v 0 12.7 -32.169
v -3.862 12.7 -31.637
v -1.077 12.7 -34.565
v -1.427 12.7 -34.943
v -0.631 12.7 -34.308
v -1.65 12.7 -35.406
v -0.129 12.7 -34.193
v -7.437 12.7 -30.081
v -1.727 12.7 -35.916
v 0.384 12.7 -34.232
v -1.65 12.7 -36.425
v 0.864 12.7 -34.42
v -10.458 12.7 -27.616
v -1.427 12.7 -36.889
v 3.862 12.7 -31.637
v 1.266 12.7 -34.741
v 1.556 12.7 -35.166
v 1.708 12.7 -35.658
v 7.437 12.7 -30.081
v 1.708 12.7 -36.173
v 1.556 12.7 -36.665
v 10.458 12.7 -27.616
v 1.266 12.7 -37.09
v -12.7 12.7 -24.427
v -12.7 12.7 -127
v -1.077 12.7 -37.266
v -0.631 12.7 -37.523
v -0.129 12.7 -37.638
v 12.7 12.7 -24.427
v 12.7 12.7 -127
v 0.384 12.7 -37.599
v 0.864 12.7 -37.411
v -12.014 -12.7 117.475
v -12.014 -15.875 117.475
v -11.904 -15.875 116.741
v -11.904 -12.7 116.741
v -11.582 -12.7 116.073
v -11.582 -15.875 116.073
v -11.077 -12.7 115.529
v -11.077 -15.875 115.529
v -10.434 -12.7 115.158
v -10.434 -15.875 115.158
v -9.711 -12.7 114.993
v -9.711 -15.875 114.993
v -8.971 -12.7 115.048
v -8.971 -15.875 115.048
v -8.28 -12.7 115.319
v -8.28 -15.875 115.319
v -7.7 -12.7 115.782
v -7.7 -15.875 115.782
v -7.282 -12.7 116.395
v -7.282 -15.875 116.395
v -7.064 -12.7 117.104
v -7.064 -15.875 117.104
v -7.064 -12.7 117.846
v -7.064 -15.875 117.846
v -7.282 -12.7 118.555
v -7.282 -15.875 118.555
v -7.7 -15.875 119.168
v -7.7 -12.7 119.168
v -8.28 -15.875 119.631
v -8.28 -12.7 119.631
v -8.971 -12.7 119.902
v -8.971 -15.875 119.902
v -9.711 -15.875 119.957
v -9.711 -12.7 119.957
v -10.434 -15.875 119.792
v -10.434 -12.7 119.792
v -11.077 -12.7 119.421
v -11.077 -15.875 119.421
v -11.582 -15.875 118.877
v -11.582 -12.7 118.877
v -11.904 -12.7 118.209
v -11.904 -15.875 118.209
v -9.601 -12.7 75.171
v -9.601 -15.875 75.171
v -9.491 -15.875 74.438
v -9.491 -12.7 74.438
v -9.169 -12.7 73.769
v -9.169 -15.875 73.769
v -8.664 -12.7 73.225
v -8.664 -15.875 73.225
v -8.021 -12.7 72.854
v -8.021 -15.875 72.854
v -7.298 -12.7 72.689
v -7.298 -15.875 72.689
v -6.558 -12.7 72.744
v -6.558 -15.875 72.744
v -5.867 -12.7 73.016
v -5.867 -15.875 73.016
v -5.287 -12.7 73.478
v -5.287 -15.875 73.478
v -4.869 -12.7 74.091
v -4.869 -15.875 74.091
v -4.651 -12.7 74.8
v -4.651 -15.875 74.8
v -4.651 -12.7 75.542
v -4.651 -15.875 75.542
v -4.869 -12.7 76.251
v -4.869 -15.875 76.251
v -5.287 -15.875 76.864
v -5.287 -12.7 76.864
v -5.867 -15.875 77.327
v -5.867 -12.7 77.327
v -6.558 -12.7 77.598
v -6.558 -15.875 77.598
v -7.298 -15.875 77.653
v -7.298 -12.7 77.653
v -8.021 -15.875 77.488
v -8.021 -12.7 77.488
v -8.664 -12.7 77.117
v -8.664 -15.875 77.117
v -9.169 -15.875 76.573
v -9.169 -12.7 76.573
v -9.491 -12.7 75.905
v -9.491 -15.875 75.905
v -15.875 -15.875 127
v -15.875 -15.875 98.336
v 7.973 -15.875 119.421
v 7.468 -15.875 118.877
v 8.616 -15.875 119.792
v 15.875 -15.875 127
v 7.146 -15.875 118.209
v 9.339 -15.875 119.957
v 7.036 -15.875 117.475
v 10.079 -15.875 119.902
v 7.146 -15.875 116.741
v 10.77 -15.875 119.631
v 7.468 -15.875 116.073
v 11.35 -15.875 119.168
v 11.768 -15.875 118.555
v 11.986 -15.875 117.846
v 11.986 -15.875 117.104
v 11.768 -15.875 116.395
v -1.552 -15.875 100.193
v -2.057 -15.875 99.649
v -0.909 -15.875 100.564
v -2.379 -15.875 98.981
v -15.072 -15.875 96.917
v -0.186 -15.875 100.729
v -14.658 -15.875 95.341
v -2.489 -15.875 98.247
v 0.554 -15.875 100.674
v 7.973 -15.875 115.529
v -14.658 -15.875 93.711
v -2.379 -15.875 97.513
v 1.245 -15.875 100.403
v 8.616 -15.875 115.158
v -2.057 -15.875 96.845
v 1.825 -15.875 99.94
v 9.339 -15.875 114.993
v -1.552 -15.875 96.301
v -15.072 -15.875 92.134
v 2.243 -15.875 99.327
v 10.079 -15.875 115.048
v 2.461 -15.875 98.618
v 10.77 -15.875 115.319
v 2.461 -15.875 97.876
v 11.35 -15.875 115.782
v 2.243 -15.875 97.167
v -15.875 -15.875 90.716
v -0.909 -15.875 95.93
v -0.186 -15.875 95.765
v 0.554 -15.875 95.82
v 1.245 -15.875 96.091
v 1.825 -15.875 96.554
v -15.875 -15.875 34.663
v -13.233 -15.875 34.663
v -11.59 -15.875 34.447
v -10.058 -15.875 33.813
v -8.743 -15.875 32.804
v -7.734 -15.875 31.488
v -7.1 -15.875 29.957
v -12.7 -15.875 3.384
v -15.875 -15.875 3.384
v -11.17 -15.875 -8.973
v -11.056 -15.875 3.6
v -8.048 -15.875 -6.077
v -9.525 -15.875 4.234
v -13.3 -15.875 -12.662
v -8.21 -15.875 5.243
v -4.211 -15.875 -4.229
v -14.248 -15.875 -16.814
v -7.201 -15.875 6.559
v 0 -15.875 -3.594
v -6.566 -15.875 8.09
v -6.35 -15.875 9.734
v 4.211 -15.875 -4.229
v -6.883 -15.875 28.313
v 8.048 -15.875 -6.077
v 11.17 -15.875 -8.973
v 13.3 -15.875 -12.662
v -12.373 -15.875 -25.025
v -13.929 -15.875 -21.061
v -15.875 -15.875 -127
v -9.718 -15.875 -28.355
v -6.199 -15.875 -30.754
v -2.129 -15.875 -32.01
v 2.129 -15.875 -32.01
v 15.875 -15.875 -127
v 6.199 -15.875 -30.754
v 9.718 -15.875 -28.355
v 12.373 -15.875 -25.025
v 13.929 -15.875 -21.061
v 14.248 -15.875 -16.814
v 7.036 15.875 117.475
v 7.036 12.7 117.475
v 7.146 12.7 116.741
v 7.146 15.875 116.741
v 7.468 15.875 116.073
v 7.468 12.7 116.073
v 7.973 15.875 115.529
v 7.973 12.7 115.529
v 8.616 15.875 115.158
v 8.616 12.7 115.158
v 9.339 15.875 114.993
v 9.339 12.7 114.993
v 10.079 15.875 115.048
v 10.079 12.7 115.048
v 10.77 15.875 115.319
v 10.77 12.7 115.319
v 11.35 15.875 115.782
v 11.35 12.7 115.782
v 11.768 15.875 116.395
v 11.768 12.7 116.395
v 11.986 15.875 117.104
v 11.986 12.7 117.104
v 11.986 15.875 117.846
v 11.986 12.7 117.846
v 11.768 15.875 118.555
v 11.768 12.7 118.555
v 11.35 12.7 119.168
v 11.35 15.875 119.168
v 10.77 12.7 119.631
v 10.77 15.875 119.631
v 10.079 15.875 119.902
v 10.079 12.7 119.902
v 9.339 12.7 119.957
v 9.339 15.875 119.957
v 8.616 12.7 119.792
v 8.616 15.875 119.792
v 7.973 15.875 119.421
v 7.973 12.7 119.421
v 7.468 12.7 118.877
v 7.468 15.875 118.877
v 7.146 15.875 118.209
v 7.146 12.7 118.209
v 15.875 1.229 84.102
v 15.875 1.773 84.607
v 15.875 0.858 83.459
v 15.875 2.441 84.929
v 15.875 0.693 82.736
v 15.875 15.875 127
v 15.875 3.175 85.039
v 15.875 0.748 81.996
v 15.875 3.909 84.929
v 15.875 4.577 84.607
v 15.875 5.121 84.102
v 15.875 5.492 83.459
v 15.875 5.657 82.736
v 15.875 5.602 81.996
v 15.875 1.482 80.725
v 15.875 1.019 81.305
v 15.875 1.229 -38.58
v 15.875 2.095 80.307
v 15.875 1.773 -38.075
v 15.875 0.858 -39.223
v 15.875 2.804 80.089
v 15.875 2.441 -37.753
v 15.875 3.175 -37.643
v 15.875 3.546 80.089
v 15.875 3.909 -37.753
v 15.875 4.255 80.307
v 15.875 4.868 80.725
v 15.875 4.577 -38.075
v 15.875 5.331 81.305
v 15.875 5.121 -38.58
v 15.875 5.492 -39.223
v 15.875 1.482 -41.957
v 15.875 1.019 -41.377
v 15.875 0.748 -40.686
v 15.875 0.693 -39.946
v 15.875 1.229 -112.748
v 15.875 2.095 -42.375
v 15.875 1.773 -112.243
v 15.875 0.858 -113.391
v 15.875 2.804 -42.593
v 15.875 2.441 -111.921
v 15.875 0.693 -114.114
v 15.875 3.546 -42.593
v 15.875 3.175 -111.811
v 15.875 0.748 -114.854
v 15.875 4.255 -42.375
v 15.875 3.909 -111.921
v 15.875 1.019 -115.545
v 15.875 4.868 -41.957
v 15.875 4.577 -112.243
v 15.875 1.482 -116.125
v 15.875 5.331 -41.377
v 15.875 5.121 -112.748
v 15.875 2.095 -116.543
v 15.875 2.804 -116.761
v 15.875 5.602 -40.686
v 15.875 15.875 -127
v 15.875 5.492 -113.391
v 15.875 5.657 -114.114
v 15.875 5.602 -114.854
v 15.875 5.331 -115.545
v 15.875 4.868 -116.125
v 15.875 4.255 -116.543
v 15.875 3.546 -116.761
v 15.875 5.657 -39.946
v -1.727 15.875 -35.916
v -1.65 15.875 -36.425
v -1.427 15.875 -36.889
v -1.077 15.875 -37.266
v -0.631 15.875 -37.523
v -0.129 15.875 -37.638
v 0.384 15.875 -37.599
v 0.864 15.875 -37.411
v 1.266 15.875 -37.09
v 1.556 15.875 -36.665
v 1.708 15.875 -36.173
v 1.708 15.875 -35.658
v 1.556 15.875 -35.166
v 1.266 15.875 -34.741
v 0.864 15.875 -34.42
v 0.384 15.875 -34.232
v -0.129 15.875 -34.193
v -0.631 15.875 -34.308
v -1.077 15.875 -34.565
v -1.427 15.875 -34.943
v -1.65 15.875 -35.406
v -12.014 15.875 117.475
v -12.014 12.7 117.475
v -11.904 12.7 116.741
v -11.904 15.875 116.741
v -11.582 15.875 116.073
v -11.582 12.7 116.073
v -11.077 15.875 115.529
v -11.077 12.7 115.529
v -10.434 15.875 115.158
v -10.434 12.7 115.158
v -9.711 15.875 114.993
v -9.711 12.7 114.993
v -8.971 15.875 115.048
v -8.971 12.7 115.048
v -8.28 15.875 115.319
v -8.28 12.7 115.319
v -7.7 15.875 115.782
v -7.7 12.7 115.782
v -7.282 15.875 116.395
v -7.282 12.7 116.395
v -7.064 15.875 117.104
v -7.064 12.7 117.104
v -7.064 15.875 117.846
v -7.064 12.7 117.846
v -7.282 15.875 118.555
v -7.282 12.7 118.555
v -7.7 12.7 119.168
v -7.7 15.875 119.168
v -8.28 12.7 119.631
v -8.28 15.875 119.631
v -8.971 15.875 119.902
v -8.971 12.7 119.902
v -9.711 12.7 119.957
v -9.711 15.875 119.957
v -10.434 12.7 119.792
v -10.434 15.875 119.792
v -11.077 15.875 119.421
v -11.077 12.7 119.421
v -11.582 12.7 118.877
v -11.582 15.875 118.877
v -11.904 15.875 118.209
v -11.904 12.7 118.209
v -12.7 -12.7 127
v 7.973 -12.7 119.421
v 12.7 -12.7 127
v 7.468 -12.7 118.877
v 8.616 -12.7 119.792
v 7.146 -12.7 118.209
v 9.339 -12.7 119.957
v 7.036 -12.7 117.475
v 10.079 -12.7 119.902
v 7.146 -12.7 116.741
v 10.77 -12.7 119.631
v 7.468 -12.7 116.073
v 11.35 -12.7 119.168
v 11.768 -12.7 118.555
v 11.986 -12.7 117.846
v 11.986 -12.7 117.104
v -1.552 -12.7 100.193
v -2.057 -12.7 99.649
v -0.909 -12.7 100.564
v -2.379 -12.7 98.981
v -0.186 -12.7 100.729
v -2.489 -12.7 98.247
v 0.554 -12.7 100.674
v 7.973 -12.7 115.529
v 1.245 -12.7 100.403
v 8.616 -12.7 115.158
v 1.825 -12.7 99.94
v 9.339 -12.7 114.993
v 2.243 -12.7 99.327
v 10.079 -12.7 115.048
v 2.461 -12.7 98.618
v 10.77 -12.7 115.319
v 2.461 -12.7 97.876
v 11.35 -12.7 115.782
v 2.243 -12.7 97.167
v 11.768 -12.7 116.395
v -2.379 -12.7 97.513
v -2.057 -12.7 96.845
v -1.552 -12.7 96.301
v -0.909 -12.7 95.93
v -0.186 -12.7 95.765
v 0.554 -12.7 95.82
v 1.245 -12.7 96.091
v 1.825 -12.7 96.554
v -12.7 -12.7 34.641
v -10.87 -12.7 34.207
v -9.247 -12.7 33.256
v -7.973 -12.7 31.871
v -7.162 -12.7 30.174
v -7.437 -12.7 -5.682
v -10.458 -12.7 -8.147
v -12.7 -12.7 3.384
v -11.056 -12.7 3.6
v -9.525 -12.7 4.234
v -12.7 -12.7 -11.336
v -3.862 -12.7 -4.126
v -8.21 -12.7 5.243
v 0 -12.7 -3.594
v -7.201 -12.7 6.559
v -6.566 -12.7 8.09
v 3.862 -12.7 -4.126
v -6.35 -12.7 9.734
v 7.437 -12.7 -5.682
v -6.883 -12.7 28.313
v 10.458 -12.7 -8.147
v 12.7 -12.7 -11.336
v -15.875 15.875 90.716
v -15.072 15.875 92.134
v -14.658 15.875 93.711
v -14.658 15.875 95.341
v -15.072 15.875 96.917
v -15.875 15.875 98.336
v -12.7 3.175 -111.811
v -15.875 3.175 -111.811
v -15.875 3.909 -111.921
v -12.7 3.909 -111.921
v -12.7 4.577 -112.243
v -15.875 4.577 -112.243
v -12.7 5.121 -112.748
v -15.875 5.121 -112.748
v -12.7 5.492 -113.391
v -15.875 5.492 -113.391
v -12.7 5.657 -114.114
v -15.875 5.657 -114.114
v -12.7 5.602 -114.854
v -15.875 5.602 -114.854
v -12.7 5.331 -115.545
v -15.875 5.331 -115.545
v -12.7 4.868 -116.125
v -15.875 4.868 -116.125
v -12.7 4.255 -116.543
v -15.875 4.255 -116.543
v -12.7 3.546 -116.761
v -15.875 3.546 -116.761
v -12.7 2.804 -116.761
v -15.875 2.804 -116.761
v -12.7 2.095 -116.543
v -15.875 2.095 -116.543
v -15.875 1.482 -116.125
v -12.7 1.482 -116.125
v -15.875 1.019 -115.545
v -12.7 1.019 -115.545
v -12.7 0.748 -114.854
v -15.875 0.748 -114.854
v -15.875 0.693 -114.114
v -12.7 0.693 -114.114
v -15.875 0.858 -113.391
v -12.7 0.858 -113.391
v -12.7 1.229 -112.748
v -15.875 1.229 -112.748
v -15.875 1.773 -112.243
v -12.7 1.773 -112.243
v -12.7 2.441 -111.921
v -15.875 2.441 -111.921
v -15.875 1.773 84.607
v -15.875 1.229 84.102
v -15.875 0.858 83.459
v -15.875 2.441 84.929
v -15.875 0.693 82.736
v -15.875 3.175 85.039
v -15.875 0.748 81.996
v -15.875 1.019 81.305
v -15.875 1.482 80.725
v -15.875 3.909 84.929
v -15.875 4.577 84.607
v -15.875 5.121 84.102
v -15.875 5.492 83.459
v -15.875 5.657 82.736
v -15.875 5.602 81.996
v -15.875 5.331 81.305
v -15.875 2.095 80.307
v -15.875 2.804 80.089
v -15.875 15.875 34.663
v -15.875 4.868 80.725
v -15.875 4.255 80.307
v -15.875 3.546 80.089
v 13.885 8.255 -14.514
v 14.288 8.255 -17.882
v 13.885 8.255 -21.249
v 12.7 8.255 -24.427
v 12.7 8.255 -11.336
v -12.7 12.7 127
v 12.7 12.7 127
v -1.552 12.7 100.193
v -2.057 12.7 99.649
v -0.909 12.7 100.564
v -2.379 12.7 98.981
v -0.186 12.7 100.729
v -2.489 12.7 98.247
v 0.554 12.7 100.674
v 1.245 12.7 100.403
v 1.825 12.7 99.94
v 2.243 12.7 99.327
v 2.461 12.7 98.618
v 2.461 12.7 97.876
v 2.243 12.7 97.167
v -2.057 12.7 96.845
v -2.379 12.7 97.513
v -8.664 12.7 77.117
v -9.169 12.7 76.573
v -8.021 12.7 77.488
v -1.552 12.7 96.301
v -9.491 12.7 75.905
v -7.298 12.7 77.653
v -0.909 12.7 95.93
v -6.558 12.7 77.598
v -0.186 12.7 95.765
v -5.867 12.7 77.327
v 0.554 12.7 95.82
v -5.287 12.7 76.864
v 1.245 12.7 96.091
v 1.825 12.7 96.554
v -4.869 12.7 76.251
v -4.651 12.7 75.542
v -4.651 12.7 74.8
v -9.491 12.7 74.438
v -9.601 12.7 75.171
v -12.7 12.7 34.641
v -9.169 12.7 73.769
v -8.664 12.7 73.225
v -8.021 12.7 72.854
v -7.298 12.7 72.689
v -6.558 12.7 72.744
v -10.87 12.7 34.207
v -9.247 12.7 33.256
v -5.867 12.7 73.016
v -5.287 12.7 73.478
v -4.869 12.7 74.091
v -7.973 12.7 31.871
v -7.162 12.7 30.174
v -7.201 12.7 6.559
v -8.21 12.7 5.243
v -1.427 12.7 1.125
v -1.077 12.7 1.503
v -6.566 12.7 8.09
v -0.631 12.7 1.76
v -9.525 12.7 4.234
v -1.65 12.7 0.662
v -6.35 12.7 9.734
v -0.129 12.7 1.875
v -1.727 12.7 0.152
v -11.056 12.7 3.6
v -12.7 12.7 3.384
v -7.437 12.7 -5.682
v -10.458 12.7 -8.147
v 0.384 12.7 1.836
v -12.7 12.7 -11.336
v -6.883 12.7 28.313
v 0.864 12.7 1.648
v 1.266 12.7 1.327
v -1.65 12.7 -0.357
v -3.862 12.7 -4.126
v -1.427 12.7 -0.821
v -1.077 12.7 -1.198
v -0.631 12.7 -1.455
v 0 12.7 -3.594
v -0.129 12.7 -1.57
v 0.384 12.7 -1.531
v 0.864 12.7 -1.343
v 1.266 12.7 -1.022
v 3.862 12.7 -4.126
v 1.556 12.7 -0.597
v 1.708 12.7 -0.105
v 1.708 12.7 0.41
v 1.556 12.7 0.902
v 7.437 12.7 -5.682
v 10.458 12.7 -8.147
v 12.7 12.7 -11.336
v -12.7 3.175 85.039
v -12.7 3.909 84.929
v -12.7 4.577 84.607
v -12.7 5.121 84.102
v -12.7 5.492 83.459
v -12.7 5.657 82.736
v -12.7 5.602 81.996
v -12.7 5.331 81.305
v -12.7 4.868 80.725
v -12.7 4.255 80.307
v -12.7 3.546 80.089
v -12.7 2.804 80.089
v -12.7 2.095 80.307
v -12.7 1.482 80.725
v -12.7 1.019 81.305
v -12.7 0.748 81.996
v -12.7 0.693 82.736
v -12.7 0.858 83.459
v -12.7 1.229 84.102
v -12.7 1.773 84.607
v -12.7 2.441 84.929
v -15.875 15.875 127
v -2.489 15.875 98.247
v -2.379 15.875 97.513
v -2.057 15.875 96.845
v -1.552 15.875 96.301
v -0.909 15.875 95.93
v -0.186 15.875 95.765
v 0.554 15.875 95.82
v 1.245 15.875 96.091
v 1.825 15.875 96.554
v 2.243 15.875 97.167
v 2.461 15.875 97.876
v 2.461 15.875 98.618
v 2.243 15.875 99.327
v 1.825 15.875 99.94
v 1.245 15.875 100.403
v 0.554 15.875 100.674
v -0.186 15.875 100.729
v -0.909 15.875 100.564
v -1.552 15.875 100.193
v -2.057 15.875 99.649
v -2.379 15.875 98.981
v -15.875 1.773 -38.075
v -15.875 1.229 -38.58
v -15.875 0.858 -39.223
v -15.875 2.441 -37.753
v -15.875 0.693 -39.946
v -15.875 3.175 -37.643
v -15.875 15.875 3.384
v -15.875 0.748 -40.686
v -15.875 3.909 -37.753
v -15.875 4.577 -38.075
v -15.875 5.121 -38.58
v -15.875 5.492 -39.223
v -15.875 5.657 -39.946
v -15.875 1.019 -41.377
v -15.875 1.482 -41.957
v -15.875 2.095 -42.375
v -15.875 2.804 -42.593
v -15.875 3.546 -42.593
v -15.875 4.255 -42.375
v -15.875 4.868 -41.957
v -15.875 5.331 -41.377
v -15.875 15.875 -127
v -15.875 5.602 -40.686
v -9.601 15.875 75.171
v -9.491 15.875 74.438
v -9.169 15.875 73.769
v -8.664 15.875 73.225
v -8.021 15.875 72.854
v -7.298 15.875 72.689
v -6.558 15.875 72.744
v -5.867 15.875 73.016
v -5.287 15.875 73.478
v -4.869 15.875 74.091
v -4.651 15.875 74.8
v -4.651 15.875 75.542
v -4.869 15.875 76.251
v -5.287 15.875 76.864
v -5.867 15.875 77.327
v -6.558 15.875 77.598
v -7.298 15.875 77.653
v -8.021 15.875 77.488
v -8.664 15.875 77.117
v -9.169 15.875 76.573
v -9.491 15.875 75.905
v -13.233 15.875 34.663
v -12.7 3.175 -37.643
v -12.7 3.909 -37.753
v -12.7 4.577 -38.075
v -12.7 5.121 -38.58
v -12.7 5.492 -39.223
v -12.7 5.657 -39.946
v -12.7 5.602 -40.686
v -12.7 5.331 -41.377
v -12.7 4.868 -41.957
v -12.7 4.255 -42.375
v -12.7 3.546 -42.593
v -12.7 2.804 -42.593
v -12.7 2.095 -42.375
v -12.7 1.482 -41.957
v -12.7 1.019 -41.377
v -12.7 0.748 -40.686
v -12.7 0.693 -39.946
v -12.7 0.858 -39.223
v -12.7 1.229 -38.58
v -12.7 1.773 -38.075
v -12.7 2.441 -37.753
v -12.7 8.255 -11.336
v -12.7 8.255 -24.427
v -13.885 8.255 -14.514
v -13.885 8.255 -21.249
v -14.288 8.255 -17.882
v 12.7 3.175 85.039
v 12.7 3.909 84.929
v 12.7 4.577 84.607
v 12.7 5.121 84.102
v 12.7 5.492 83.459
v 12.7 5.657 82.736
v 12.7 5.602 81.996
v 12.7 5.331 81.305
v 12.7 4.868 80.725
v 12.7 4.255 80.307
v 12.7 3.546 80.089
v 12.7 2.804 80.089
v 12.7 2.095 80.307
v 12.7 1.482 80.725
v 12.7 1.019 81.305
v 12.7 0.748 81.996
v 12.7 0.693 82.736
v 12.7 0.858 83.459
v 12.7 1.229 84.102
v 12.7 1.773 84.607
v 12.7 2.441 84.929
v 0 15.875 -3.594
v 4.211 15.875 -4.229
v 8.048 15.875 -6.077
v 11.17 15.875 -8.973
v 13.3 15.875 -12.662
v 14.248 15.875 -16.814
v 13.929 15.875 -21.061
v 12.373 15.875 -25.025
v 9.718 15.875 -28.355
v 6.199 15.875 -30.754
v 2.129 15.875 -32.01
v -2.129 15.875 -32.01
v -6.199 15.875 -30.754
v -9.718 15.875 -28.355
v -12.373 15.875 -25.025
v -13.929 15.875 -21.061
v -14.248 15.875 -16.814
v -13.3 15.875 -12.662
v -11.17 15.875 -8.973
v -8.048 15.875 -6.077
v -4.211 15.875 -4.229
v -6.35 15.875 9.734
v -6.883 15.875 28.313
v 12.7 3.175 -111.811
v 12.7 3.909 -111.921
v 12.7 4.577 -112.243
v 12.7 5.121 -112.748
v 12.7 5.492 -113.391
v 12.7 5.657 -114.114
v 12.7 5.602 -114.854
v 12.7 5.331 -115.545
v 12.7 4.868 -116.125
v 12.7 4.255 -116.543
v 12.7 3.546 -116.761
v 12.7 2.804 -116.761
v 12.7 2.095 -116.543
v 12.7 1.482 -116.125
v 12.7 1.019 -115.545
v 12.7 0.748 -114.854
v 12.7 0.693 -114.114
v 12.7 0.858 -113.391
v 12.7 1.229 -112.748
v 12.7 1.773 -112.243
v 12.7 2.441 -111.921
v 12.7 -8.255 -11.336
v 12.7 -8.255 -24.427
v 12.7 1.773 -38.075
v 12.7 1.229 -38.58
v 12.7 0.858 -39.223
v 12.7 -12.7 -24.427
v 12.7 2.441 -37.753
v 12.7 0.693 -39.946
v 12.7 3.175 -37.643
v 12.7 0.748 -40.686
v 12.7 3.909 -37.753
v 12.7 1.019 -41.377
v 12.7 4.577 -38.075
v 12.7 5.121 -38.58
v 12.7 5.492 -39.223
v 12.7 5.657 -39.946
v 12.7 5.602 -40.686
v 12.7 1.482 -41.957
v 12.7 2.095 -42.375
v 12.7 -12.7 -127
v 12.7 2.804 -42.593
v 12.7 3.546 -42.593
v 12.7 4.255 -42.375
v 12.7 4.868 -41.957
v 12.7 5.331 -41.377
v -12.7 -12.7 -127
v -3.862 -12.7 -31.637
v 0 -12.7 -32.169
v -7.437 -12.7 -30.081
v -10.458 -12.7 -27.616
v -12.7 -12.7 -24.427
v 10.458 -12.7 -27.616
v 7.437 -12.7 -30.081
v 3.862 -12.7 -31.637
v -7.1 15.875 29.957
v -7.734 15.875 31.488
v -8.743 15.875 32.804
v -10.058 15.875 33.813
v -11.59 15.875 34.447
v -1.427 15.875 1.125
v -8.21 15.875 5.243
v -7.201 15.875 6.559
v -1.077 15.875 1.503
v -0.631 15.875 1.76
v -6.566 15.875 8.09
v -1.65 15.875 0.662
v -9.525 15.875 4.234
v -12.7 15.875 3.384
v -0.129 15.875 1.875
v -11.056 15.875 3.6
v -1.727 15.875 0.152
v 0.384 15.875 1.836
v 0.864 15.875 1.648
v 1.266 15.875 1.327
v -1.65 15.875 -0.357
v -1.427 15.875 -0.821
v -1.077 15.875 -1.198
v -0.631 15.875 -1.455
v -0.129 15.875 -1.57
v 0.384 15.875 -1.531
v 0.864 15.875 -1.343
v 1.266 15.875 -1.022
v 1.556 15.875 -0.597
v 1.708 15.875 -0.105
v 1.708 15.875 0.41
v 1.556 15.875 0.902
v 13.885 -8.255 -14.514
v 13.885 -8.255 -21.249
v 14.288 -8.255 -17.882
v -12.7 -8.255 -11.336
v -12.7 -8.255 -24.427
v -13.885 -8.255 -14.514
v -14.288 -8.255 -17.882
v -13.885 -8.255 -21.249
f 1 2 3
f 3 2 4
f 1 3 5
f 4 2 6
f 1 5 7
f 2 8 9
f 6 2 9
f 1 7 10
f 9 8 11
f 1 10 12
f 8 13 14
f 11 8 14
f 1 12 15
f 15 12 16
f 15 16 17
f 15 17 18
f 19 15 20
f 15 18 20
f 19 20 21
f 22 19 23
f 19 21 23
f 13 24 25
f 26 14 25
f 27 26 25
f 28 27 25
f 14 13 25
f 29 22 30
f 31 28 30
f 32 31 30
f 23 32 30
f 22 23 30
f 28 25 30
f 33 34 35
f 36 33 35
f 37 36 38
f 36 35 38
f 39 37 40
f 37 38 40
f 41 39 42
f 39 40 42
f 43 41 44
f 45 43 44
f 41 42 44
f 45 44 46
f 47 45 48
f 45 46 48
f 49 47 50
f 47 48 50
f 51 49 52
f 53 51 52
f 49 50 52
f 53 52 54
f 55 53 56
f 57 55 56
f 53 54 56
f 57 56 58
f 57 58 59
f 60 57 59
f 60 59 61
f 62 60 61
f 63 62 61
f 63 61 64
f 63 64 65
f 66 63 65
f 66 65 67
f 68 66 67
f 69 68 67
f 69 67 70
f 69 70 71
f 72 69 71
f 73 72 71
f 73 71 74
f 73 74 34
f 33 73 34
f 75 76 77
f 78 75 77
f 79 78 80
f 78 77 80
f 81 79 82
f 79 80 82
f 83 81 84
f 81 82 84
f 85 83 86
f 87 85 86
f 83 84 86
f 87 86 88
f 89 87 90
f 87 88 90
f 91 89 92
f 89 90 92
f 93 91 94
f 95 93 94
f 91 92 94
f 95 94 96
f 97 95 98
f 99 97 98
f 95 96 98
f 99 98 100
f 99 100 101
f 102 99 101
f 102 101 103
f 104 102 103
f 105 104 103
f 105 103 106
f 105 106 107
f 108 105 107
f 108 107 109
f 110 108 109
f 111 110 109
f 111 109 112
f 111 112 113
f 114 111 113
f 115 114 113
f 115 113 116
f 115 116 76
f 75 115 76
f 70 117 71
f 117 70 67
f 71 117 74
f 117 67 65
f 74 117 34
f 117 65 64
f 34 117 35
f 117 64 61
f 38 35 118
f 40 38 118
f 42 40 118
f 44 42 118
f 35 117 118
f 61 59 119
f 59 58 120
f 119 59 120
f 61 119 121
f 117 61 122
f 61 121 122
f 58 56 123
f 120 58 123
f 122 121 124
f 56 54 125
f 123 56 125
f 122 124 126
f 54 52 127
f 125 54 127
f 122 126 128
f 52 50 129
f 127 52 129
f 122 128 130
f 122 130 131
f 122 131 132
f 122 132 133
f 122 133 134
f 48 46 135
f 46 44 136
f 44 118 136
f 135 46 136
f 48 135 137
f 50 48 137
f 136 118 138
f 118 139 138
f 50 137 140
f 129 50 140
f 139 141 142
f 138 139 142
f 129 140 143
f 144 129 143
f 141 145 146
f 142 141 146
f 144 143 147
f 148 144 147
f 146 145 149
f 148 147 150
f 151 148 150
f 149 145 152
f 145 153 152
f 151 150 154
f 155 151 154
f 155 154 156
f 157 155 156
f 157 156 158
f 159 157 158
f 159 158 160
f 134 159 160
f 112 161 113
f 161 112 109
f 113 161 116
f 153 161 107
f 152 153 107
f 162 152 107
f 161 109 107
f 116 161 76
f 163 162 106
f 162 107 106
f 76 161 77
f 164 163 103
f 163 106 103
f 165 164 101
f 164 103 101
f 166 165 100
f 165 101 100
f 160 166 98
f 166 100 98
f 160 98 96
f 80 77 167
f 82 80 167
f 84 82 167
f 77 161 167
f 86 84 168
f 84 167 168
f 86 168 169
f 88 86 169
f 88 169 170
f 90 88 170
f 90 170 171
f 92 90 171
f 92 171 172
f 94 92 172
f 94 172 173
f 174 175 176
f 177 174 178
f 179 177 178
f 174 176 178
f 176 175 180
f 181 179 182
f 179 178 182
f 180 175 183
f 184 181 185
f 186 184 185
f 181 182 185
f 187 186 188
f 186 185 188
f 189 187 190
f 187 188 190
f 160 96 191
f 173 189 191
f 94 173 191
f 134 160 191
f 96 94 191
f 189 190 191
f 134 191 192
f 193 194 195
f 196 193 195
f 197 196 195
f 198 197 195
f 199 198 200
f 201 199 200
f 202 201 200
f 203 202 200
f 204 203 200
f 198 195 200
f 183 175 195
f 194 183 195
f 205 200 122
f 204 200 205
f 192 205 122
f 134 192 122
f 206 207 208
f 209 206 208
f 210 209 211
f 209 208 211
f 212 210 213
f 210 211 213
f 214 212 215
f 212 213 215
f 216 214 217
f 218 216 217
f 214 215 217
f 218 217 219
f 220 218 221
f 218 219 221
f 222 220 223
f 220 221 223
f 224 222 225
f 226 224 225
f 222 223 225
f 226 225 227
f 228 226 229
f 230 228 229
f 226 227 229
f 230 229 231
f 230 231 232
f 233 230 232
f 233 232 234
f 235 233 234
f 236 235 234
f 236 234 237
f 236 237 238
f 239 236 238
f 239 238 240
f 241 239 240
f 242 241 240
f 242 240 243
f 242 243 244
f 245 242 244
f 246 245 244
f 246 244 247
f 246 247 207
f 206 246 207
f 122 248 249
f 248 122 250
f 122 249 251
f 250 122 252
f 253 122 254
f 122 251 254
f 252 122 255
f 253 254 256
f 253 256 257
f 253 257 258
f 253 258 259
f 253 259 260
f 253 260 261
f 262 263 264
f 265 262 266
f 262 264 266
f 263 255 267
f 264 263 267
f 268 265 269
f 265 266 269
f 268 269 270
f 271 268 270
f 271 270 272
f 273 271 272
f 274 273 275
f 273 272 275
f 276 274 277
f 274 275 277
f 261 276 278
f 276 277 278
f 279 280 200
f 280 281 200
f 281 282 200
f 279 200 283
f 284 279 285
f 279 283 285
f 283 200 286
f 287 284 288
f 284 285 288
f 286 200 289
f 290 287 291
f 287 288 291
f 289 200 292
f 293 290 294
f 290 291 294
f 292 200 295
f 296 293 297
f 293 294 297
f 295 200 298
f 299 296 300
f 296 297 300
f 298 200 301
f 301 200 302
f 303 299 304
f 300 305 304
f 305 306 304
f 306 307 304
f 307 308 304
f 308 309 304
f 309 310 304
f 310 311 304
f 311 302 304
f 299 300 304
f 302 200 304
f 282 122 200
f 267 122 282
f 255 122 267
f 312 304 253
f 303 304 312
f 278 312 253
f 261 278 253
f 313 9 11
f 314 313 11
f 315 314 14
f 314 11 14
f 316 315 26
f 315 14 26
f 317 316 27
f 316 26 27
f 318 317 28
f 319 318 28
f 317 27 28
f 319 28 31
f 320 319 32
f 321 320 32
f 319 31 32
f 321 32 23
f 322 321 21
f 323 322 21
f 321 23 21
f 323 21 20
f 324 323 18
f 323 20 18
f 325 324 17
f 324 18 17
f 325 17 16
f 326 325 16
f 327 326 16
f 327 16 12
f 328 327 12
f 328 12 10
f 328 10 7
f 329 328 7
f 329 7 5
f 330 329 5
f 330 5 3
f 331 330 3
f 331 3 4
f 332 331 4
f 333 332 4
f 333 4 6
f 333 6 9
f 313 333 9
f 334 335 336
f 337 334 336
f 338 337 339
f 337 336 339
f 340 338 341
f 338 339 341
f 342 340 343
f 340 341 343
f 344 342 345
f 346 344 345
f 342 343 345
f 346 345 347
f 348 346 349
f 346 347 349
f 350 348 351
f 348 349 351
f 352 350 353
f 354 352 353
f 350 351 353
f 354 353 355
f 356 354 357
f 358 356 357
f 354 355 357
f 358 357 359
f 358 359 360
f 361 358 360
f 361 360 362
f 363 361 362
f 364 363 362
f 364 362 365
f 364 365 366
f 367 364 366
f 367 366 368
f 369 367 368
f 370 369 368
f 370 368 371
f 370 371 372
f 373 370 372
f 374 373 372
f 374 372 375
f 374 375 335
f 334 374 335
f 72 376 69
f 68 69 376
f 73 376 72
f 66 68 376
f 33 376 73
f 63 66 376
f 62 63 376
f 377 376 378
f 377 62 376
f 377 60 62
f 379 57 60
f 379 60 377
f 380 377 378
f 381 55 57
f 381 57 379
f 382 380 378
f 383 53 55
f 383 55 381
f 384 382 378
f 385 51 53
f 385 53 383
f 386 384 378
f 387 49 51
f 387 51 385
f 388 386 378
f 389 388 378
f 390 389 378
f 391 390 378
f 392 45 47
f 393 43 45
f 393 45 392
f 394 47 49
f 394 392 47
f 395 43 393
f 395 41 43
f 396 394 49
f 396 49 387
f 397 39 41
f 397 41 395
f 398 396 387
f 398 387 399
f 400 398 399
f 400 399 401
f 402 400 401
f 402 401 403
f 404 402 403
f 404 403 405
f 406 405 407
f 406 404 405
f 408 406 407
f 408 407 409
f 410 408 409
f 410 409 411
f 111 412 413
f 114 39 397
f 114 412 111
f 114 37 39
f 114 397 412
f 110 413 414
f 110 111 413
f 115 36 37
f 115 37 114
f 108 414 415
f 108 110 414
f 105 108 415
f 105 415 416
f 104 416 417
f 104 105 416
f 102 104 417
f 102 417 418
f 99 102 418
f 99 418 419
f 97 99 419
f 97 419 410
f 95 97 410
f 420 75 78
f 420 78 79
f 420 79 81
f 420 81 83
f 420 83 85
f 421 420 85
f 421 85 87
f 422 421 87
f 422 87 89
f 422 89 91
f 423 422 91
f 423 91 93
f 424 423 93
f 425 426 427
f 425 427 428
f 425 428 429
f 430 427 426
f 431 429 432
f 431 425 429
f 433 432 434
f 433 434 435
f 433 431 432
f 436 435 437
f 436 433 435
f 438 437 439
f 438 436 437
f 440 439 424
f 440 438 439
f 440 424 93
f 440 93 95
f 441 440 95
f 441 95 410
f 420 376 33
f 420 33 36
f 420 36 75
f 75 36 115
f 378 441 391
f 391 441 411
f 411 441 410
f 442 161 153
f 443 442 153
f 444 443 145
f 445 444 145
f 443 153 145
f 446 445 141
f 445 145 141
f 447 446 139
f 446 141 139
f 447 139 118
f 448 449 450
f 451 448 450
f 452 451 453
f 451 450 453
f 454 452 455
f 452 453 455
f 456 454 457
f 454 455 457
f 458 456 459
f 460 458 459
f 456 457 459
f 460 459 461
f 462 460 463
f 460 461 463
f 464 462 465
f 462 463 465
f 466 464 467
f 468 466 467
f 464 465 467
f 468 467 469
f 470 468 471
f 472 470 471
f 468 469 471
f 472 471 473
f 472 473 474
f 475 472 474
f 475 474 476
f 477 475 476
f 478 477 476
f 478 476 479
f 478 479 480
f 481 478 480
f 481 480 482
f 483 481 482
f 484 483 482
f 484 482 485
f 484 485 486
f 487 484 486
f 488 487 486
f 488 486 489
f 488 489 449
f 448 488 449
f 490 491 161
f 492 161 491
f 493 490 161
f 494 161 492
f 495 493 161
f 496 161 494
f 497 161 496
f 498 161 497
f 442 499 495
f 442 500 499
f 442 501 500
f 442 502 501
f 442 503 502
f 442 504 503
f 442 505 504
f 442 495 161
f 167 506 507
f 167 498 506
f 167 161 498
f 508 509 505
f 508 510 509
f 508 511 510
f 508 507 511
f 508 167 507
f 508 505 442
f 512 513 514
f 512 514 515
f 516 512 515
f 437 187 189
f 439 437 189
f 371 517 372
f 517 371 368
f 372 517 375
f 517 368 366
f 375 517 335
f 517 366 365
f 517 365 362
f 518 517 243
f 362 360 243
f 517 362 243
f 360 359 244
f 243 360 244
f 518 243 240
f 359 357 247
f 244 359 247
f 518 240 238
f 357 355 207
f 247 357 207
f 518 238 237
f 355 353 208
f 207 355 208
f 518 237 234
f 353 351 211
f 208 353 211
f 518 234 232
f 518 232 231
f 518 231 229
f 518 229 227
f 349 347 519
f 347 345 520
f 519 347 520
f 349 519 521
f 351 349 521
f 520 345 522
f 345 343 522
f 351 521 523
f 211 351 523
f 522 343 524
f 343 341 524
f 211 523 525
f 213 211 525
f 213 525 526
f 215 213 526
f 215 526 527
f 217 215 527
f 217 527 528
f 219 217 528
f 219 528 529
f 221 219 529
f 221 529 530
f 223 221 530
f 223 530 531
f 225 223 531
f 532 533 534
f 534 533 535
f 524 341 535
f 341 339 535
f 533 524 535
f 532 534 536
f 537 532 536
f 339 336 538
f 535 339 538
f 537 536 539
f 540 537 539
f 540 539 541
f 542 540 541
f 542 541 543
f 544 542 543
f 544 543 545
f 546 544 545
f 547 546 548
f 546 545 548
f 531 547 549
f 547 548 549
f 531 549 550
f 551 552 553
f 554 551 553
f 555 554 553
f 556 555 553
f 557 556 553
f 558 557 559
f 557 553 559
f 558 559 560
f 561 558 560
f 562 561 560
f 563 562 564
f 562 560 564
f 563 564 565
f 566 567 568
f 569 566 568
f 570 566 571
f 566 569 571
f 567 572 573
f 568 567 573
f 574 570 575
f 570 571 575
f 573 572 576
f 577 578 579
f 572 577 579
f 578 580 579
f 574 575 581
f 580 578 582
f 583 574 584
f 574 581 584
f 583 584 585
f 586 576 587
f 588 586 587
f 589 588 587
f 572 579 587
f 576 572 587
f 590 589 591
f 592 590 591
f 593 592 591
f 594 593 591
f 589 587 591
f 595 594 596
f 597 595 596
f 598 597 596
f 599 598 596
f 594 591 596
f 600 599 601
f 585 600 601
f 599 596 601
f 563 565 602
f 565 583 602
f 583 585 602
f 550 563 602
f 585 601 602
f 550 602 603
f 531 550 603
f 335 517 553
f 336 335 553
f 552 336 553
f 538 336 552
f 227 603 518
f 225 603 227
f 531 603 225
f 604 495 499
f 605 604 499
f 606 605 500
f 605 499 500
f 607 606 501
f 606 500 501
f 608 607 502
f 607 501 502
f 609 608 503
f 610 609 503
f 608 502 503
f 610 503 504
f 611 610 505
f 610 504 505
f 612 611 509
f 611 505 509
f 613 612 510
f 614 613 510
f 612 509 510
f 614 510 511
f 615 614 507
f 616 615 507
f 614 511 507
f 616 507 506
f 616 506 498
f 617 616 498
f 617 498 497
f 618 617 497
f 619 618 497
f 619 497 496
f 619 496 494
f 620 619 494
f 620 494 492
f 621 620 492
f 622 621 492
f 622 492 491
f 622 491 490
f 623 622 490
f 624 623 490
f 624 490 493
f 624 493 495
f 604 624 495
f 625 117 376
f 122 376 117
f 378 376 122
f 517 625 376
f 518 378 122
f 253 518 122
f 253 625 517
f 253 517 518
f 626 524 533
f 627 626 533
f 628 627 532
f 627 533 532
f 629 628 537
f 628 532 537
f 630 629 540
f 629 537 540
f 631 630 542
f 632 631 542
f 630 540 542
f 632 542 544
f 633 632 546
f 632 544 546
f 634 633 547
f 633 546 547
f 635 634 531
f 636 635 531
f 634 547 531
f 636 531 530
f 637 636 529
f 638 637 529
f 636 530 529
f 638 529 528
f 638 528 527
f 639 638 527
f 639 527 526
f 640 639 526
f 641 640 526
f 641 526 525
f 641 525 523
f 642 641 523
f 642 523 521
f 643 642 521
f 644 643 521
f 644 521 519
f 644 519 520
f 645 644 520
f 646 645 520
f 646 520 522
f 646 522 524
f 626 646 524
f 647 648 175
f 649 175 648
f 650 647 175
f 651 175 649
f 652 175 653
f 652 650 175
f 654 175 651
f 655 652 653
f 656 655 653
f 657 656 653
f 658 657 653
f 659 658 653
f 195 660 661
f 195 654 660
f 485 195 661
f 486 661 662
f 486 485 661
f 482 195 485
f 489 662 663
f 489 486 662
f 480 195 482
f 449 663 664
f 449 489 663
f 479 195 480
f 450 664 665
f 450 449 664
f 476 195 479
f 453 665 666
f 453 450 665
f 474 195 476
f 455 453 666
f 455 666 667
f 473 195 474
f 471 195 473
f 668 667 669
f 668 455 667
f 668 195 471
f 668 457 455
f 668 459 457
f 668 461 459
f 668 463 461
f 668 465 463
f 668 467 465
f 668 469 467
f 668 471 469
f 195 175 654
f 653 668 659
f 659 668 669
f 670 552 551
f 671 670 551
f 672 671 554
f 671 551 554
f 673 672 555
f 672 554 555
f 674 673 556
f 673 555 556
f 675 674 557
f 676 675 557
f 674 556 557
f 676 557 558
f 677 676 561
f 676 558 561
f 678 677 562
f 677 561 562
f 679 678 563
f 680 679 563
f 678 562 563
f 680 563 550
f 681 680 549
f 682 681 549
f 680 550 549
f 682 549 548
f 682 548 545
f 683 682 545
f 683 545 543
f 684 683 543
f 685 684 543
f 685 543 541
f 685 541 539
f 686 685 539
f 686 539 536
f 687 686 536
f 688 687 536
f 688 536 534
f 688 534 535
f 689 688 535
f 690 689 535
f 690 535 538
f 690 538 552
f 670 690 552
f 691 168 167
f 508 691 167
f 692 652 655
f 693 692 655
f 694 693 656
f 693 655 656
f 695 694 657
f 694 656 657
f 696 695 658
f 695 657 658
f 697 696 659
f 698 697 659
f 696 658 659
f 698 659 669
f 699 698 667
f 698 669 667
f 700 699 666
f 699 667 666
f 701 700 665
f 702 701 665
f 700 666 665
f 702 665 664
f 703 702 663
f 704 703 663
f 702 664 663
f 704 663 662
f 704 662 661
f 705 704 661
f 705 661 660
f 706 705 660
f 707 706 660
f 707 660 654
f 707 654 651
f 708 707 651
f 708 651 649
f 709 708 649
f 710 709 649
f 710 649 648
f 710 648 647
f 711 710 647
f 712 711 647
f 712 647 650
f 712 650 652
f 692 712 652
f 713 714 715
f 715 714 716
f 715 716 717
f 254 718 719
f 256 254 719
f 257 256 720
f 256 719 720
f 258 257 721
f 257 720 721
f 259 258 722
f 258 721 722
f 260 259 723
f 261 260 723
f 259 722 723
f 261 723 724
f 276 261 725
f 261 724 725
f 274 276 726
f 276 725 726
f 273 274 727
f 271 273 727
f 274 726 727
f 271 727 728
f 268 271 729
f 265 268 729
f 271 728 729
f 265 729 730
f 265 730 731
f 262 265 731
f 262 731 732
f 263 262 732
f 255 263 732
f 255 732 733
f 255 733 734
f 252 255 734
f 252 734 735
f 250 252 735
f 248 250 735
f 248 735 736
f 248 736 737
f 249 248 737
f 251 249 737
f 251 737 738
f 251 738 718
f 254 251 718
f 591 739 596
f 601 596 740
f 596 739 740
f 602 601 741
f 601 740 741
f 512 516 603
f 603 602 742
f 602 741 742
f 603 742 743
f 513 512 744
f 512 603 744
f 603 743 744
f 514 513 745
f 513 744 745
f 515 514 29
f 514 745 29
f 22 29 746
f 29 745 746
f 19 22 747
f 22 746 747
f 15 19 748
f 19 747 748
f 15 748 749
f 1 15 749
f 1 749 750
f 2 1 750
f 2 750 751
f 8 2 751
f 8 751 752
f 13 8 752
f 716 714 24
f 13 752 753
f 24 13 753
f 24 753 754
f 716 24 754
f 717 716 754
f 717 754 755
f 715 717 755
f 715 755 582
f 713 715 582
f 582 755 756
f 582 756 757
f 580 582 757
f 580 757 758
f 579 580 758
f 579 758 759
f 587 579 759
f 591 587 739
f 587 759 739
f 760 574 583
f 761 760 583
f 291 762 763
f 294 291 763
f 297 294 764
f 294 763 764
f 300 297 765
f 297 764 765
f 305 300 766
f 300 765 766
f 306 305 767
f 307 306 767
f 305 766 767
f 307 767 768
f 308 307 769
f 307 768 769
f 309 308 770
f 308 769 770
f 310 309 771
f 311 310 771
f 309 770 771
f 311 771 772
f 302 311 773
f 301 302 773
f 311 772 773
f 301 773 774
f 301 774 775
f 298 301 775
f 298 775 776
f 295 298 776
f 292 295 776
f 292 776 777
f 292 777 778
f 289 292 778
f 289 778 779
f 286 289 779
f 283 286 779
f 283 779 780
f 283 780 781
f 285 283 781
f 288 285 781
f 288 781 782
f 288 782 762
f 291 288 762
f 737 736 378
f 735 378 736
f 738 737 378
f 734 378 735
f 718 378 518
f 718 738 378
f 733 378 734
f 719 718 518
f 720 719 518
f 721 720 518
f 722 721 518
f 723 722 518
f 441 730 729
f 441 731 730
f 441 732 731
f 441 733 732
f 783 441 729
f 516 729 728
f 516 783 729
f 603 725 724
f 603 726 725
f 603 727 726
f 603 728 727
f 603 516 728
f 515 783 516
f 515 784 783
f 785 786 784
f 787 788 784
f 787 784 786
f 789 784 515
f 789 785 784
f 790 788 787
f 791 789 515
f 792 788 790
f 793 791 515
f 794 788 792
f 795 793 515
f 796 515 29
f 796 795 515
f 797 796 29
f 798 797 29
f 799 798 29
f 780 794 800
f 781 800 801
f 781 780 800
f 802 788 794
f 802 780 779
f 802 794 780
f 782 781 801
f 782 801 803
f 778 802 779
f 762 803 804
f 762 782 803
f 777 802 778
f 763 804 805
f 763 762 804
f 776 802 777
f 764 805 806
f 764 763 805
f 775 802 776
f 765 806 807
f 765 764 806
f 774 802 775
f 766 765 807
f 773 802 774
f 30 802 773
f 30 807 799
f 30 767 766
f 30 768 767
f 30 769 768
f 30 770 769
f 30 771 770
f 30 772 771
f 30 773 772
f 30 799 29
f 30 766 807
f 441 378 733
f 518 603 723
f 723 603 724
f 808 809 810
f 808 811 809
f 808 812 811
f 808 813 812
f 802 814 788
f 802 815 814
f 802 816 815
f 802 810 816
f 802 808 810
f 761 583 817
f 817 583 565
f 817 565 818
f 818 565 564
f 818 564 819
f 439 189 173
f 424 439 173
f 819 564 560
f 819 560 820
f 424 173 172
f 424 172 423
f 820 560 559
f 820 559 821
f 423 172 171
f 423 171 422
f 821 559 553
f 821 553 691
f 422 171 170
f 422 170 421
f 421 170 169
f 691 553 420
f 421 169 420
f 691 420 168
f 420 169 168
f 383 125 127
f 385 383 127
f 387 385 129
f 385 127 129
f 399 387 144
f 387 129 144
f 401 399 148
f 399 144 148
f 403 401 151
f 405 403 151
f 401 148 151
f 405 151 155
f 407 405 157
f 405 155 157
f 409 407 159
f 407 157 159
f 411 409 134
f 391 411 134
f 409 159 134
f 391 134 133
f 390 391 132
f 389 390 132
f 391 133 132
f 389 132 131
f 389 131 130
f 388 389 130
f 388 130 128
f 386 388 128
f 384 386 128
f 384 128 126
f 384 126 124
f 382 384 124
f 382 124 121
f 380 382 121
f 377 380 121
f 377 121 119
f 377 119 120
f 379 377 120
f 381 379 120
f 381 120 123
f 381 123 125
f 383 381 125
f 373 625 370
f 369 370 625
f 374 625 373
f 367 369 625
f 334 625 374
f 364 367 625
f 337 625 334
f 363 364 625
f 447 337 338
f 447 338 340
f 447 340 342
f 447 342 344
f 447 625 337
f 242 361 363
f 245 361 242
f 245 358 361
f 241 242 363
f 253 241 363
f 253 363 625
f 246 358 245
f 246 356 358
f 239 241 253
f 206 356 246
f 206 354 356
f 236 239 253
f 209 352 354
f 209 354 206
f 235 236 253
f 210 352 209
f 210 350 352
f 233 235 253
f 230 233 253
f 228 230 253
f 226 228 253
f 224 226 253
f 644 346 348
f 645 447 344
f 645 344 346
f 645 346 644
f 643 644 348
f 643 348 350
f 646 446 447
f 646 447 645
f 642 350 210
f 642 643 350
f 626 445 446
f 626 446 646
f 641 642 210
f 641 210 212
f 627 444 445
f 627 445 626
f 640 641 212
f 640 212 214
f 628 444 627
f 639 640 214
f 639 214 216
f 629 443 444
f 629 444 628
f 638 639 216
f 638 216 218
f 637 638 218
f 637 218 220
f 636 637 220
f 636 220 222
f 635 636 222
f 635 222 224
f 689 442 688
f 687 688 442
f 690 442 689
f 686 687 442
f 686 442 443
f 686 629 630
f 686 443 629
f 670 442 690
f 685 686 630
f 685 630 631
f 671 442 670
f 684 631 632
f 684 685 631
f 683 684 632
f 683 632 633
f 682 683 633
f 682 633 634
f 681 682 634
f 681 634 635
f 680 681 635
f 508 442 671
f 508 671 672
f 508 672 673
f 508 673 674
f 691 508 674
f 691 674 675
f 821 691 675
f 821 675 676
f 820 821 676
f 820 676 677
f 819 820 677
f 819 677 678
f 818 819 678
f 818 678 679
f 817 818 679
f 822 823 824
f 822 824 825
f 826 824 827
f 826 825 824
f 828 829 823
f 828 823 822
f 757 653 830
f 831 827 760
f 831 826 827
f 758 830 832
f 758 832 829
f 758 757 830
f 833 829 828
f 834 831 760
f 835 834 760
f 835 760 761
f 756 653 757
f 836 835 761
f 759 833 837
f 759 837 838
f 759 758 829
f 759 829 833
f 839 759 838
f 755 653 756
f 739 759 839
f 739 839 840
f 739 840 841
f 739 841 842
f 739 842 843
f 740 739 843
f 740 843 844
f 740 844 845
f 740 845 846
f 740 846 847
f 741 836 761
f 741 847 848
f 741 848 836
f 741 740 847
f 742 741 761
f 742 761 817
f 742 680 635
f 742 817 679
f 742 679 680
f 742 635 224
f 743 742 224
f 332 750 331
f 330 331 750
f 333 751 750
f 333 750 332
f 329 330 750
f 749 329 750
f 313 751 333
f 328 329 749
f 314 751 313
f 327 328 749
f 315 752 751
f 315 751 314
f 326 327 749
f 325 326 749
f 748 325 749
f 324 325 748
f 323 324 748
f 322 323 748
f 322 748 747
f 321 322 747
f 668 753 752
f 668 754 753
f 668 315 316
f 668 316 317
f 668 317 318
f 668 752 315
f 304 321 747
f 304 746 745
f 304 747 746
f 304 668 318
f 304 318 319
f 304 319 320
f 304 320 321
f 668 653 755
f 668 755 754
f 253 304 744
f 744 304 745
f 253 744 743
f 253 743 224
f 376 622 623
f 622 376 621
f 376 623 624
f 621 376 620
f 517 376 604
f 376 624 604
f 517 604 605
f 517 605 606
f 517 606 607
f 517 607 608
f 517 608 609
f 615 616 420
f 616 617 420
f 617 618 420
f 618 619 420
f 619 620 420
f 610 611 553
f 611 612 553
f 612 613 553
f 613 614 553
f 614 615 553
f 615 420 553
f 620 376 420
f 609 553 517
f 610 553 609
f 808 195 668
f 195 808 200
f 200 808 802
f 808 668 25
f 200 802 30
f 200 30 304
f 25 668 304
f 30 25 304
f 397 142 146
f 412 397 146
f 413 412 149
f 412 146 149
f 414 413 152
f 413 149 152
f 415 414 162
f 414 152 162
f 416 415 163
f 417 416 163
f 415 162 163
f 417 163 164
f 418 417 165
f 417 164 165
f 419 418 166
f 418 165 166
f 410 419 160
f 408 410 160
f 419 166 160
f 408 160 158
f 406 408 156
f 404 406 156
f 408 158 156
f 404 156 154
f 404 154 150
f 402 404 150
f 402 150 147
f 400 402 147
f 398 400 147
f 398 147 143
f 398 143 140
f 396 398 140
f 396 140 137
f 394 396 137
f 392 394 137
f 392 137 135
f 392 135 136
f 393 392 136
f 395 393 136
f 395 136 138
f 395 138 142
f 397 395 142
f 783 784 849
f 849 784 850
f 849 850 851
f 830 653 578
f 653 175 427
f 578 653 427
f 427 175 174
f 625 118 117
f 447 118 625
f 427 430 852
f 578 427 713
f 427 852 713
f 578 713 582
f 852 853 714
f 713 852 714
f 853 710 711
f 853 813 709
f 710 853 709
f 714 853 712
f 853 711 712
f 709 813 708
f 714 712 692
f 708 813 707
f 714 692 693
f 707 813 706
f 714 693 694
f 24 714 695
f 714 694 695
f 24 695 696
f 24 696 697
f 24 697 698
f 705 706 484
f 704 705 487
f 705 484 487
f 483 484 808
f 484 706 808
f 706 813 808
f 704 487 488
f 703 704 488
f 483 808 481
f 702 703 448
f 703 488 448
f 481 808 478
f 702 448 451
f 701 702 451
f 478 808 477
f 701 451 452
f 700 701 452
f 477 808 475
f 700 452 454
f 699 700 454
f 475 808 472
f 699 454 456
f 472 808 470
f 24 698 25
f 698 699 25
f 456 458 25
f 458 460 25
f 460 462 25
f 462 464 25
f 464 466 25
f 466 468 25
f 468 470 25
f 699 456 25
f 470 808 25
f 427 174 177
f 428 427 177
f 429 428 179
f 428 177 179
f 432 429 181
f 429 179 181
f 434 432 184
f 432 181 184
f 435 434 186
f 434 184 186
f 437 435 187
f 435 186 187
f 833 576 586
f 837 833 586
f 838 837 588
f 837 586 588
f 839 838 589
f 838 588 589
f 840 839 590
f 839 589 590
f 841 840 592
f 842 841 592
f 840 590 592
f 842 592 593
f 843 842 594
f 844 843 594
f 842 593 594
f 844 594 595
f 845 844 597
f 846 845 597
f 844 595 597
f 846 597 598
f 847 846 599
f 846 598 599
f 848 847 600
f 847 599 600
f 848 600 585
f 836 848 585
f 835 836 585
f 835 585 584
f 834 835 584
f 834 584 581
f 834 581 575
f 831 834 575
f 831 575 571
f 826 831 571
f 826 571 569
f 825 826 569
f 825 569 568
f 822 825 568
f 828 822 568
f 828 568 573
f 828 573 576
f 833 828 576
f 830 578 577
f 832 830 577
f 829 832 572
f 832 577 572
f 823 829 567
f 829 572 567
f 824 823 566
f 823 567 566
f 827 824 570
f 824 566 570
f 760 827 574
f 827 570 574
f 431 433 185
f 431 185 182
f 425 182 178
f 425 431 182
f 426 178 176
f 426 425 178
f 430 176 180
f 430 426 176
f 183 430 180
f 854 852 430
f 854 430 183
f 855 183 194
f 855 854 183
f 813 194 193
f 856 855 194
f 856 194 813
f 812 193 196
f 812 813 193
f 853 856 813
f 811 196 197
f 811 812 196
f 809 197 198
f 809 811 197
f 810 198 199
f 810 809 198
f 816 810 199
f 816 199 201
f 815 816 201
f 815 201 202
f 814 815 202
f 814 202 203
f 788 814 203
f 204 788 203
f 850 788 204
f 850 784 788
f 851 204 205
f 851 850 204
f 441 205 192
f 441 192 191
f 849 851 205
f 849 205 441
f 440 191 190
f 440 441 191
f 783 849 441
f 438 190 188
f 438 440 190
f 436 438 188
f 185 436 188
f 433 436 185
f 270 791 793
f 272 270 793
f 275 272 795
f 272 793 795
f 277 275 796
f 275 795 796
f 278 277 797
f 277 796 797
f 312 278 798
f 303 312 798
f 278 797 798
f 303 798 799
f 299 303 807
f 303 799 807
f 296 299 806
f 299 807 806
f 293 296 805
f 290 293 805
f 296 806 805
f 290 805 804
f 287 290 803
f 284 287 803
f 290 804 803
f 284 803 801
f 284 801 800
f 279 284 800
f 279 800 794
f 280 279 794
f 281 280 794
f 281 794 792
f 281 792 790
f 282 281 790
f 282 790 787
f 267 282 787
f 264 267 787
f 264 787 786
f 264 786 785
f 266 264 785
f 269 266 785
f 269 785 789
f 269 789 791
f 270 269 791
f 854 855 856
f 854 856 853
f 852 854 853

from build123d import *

# Parameters (mm, degrees)
BOSS_EXTRUDE1_DEPTH           = 127
BOSS_EXTRUDE1_DEPTH_BACK      = 127
SKETCH3_W                     = 31.75
SKETCH3_H                     = 31.75
SKETCH3_W_2                   = 25.4
SKETCH3_H_2                   = 25.4
F_10_CLEARANCE_HOLE1_D        = 4.9784
SKETCH7_R                     = 14.2875
CUT_EXTRUDE1_DEPTH            = 7.62
CUT_EXTRUDE2_START            = -7.62
SKETCH8_R                     = 14.2875
CUT_EXTRUDE2_DEPTH            = 7.62
CUT_EXTRUDE3_DEPTH            = 132.867653824
F_10_CLEARANCE_HOLE2_D        = 4.9784
SKETCH13_R                    = 6.35
CUT_EXTRUDE4_DEPTH            = 132.867653824
TAP_DRILL_FOR_8_32_TAP1_D     = 3.4544
TAP_DRILL_FOR_8_32_TAP1_DEPTH = 5.08
TAP_DRILL_FOR_8_32_TAP1_TIP   = 1.037806461


with BuildPart() as part:
    # Sketch3 → Boss-Extrude1 (new, two sides: drawn at the far end of the back side and taken through both)
    with BuildSketch(Plane.XY.offset(-BOSS_EXTRUDE1_DEPTH_BACK)):
        Rectangle(SKETCH3_W, SKETCH3_H)
        Rectangle(SKETCH3_W_2, SKETCH3_H_2, mode=Mode.SUBTRACT)
    extrude(amount=BOSS_EXTRUDE1_DEPTH + BOSS_EXTRUDE1_DEPTH_BACK)

    # #10 Clearance Hole1 (through all)
    with Locations(Plane(origin=(0, 15.875, 0), x_dir=(1, 0, 0), z_dir=(0, 1, 0))):
        with Locations((-9.525, -117.475), (9.525, -117.475), (0, -98.247200001), (-7.111939052, -75.171256705)):
            Hole(F_10_CLEARANCE_HOLE1_D / 2)

    # Sketch7 → Cut-Extrude1 (cut)
    with BuildSketch(Plane(origin=(0, 15.875, 0), x_dir=(1, 0, 0), z_dir=(0, 1, 0))):
        with Locations(Location((0, 17.8816, 0), (0, 0, 270))):
            Circle(SKETCH7_R)
    extrude(amount=-CUT_EXTRUDE1_DEPTH, mode=Mode.SUBTRACT)

    # Sketch8 → Cut-Extrude2 (cut)
    with BuildSketch(Plane.XZ.offset(15.875).offset(CUT_EXTRUDE2_START)):
        with Locations(Location((0, -17.8816, 0), (0, 0, 90))):
            Circle(SKETCH8_R)
    extrude(amount=CUT_EXTRUDE2_DEPTH, mode=Mode.SUBTRACT)

    # Sketch9 → Cut-Extrude3 (cut, through all)
    with BuildSketch(Plane.XZ.offset(15.875)):
        with BuildLine():
            Line((-15.875, 34.663398263), (-15.875, 3.38353779))
            Line((-15.875, 3.38353779), (-12.7, 3.38353779))
            ThreePointArc((-12.7, 3.38353779), (-8.209871939, 5.243409729), (-6.35, 9.73353779))
            Line((-6.35, 9.73353779), (-6.883240315, 28.313398263))
            ThreePointArc((-6.883240315, 28.313398263), (-8.743112255, 32.803526323), (-13.233240315, 34.663398263))
            Line((-13.233240315, 34.663398263), (-15.875, 34.663398263))
        make_face()
    extrude(amount=-CUT_EXTRUDE3_DEPTH, mode=Mode.SUBTRACT)

    # #10 Clearance Hole2 (through all)
    with Locations(Plane(origin=(15.875, 0, 0), x_dir=(0, 0, -1), z_dir=(1, 0, 0))):
        with Locations((-82.55, 3.175), (114.3, 3.175), (40.132, 3.175)):
            Hole(F_10_CLEARANCE_HOLE2_D / 2)

    # Sketch13 → Cut-Extrude4 (cut, through all)
    with BuildSketch(Plane.XZ.offset(15.875)):
        with Locations((-20.955, 94.525686877)):
            Circle(SKETCH13_R)
    extrude(amount=-CUT_EXTRUDE4_DEPTH, mode=Mode.SUBTRACT)

    # Tap Drill for #8-32 Tap1
    with Locations(Plane(origin=(0, 15.875, 0), x_dir=(1, 0, 0), z_dir=(0, 1, 0))):
        with Locations((0, 35.9156), (0, -0.1524)):
            Hole(TAP_DRILL_FOR_8_32_TAP1_D / 2, depth=TAP_DRILL_FOR_8_32_TAP1_DEPTH)
            with Locations((0, 0, -(TAP_DRILL_FOR_8_32_TAP1_DEPTH + TAP_DRILL_FOR_8_32_TAP1_TIP / 2))):  # 118° drill point
                Cone(0, TAP_DRILL_FOR_8_32_TAP1_D / 2, TAP_DRILL_FOR_8_32_TAP1_TIP, mode=Mode.SUBTRACT)


solid = part.part
